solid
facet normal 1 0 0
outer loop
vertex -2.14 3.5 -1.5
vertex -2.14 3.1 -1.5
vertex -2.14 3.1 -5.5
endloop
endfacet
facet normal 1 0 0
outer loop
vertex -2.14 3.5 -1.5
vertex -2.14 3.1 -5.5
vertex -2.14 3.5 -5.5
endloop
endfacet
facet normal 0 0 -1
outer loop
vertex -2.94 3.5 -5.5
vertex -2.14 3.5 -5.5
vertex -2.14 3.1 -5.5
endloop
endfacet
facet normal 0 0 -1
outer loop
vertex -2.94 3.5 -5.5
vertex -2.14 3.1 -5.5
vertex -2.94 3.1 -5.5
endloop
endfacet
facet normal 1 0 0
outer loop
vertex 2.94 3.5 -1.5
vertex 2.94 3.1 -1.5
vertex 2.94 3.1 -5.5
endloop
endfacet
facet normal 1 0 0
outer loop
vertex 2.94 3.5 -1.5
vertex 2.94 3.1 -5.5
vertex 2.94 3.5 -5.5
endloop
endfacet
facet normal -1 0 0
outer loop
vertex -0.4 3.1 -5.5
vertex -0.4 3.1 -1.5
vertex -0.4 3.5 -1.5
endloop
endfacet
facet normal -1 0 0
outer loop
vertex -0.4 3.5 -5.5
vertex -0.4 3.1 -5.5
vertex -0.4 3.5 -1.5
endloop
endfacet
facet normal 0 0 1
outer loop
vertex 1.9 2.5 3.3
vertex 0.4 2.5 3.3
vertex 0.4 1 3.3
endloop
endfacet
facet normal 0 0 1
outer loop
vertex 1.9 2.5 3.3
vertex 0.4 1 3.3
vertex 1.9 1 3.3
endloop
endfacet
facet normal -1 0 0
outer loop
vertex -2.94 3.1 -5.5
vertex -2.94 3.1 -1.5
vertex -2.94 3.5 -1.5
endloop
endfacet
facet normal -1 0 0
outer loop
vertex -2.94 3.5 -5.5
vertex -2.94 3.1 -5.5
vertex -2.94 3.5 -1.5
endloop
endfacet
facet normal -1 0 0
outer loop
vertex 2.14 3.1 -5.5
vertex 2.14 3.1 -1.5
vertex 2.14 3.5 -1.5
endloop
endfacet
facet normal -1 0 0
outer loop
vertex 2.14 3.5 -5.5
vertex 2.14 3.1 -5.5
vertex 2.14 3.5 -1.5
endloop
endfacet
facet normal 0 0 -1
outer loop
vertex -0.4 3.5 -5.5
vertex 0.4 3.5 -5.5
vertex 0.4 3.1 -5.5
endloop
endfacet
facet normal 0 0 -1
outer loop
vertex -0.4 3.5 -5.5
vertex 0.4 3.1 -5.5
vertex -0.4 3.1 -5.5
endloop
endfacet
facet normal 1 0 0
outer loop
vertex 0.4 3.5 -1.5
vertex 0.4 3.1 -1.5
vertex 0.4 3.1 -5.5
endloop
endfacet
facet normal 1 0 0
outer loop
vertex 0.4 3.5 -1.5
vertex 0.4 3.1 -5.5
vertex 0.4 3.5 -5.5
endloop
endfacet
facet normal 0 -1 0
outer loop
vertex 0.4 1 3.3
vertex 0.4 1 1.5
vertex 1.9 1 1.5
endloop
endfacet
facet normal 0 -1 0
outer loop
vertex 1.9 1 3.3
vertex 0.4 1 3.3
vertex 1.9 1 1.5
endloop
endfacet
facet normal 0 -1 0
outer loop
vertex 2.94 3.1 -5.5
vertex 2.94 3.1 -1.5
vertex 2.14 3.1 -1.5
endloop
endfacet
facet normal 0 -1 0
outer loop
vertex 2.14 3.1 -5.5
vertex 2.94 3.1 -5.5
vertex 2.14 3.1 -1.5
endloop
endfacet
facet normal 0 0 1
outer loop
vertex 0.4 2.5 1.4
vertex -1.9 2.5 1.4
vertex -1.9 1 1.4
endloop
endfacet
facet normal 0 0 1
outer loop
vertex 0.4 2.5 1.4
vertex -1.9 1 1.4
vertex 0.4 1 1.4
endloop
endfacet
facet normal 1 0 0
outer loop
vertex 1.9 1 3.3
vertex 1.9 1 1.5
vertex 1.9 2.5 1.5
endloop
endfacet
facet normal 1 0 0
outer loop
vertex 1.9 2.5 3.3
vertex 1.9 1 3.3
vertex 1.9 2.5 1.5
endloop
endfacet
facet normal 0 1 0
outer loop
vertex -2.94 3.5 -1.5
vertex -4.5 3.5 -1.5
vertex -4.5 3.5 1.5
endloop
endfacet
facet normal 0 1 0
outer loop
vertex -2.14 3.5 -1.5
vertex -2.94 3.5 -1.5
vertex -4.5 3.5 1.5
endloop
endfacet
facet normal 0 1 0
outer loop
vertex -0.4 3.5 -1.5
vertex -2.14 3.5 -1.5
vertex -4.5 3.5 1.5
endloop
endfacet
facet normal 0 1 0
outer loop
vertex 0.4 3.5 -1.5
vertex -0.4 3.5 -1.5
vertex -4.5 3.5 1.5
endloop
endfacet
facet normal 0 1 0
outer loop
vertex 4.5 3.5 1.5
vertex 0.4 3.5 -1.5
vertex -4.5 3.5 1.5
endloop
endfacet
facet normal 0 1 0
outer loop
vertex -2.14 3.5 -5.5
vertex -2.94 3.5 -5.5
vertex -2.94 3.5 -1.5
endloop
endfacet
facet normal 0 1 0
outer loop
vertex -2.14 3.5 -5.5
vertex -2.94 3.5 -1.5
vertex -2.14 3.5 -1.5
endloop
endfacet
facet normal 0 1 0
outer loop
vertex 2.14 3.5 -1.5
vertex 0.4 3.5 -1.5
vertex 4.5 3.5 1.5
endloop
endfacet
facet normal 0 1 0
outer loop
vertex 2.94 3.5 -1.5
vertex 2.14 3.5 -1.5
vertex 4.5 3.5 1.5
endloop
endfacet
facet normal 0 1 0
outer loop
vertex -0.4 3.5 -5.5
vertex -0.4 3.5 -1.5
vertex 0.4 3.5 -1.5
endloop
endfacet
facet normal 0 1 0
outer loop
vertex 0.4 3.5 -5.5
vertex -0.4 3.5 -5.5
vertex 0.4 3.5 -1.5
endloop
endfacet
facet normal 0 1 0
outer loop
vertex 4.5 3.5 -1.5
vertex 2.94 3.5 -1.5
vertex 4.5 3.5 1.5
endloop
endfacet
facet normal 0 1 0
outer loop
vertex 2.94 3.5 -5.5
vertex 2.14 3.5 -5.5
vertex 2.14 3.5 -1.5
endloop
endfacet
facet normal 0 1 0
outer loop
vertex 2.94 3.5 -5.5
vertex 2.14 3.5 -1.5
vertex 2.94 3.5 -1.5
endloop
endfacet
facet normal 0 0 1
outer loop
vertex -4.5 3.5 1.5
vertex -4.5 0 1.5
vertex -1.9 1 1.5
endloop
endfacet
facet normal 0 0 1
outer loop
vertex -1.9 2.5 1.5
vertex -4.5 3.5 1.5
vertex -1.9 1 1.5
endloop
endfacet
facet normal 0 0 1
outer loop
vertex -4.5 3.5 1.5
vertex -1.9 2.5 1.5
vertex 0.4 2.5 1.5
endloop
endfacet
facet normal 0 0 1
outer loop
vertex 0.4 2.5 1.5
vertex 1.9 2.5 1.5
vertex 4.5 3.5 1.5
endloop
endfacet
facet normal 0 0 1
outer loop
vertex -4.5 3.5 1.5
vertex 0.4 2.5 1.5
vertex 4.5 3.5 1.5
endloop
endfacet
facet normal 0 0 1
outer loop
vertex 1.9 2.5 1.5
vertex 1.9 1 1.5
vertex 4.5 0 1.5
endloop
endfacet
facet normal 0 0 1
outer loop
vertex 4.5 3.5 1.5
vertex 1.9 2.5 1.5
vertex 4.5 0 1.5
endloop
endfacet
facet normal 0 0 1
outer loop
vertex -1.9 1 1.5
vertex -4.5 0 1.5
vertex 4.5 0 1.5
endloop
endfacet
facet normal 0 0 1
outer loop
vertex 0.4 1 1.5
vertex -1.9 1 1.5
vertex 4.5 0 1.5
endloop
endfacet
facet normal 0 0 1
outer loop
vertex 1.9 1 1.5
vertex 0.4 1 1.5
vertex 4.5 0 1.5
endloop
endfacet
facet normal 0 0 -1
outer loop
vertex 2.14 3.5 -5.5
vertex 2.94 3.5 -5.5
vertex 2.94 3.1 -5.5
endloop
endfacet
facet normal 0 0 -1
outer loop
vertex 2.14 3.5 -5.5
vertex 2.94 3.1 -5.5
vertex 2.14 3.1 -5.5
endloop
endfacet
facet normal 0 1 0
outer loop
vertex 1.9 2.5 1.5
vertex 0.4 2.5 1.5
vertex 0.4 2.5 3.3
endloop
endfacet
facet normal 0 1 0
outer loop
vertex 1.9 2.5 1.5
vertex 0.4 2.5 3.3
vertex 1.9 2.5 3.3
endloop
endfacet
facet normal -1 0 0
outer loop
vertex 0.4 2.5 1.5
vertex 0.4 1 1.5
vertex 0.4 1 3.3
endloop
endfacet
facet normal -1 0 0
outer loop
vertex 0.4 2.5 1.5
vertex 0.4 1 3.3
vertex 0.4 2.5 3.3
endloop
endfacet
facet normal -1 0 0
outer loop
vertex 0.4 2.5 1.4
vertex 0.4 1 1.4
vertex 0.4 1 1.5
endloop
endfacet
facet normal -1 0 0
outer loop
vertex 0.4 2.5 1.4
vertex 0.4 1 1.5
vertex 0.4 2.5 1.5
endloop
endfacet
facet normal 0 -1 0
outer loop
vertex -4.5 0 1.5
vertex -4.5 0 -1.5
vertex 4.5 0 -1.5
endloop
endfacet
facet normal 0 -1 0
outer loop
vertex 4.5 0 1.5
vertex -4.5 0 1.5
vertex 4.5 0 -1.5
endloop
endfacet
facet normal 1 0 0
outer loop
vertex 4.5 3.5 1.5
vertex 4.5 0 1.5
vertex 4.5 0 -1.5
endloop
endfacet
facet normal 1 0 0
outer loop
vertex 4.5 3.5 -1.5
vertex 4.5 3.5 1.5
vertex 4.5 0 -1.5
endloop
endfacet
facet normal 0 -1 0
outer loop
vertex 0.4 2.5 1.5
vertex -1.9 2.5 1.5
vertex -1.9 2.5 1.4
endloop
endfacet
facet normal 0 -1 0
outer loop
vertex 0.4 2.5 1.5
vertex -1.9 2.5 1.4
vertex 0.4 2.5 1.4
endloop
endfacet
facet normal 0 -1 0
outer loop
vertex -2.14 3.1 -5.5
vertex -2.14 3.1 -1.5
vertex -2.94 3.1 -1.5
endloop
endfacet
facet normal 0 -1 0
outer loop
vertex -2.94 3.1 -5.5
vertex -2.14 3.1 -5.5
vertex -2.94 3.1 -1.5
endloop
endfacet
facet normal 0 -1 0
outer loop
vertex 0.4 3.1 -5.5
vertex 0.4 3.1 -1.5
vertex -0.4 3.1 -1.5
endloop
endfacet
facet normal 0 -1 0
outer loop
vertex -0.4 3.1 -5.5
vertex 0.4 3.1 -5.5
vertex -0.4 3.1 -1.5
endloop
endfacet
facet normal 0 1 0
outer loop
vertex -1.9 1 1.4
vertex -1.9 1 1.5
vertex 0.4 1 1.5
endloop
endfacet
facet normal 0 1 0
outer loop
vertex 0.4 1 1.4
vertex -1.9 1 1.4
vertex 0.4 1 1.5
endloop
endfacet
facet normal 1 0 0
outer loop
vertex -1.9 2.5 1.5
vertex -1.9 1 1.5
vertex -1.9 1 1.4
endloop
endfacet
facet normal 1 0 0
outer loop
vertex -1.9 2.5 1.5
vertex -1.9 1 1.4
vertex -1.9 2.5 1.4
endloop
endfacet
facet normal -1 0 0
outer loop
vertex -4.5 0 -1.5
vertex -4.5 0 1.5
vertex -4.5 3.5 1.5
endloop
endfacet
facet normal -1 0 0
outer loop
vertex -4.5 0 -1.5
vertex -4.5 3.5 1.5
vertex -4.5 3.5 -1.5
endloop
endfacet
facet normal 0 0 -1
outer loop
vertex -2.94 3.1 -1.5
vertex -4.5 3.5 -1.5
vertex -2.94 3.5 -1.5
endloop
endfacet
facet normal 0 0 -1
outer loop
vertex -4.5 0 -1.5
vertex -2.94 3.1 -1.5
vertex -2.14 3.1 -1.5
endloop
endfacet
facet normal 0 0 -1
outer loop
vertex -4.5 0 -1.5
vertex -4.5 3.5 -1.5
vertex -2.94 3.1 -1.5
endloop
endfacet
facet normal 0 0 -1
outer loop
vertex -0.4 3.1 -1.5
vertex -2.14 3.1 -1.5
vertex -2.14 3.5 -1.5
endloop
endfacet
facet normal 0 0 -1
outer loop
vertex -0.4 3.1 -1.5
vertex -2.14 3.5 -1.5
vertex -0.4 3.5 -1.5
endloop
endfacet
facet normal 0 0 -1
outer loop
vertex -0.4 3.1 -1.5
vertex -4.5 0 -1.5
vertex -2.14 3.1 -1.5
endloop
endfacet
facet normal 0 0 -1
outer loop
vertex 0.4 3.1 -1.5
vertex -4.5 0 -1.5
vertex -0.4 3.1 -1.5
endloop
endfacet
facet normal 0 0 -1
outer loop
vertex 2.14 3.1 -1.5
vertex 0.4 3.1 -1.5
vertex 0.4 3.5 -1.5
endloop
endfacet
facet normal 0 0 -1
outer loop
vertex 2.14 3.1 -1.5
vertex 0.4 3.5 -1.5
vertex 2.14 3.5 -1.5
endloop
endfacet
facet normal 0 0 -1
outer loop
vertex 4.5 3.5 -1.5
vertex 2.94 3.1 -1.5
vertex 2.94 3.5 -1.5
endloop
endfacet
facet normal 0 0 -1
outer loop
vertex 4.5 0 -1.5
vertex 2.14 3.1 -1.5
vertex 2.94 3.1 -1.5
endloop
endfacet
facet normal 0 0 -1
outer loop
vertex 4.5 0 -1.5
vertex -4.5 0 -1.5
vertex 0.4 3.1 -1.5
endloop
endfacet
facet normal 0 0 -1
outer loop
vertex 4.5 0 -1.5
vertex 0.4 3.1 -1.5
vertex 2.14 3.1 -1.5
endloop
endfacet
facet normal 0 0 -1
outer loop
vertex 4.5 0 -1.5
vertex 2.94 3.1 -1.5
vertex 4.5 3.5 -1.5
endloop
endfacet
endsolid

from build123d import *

# Parameters (mm, degrees)
SKETCH_1_W          = 9
SKETCH_1_H          = 3
EXTRUDE_1_DEPTH     = 3.5
SKETCH_2_W          = 3.8
SKETCH_2_H          = 1.5
CUT_EXTRUDE_1_DEPTH = 0.1
SKETCH_3_W          = 1.5
SKETCH_3_H          = 1.5
EXTRUDE_2_DEPTH     = 1.9
SKETCH_4_W          = 0.8
SKETCH_4_H          = 0.4
EXTRUDE_3_DEPTH     = 4


with BuildPart() as part:
    # Эскиз1 → Бобышка-Вытянуть1 (new body)
    with BuildSketch(Plane(origin=(0, 0, 0), x_dir=(1, 0, 0), z_dir=(0, 1, 0))):
        Rectangle(SKETCH_1_W, SKETCH_1_H)
    extrude(amount=EXTRUDE_1_DEPTH)

    # Эскиз2 → Вырез-Вытянуть1 (cut)
    with BuildSketch(Plane.XY.offset(1.5)):
        with Locations((0, 1.75)):
            Rectangle(SKETCH_2_W, SKETCH_2_H)
    extrude(amount=-CUT_EXTRUDE_1_DEPTH, mode=Mode.SUBTRACT)

    # Эскиз3 → Бобышка-Вытянуть2 (add)
    with BuildSketch(Plane.XY.offset(1.4)):
        with Locations((1.15, 1.75)):
            Rectangle(SKETCH_3_W, SKETCH_3_H)
    extrude(amount=EXTRUDE_2_DEPTH)

    # Эскиз4 → Бобышка-Вытянуть3 (add)
    with BuildSketch(Plane(origin=(0, 0, -1.5), x_dir=(-1, 0, 0), z_dir=(0, 0, -1))):
        with Locations((-2.54, 3.3)):
            Rectangle(SKETCH_4_W, SKETCH_4_H)
        with Locations((0, 3.3)):
            Rectangle(SKETCH_4_W, SKETCH_4_H)
        with Locations((2.54, 3.3)):
            Rectangle(SKETCH_4_W, SKETCH_4_H)
    extrude(amount=EXTRUDE_3_DEPTH)


solid = part.part
